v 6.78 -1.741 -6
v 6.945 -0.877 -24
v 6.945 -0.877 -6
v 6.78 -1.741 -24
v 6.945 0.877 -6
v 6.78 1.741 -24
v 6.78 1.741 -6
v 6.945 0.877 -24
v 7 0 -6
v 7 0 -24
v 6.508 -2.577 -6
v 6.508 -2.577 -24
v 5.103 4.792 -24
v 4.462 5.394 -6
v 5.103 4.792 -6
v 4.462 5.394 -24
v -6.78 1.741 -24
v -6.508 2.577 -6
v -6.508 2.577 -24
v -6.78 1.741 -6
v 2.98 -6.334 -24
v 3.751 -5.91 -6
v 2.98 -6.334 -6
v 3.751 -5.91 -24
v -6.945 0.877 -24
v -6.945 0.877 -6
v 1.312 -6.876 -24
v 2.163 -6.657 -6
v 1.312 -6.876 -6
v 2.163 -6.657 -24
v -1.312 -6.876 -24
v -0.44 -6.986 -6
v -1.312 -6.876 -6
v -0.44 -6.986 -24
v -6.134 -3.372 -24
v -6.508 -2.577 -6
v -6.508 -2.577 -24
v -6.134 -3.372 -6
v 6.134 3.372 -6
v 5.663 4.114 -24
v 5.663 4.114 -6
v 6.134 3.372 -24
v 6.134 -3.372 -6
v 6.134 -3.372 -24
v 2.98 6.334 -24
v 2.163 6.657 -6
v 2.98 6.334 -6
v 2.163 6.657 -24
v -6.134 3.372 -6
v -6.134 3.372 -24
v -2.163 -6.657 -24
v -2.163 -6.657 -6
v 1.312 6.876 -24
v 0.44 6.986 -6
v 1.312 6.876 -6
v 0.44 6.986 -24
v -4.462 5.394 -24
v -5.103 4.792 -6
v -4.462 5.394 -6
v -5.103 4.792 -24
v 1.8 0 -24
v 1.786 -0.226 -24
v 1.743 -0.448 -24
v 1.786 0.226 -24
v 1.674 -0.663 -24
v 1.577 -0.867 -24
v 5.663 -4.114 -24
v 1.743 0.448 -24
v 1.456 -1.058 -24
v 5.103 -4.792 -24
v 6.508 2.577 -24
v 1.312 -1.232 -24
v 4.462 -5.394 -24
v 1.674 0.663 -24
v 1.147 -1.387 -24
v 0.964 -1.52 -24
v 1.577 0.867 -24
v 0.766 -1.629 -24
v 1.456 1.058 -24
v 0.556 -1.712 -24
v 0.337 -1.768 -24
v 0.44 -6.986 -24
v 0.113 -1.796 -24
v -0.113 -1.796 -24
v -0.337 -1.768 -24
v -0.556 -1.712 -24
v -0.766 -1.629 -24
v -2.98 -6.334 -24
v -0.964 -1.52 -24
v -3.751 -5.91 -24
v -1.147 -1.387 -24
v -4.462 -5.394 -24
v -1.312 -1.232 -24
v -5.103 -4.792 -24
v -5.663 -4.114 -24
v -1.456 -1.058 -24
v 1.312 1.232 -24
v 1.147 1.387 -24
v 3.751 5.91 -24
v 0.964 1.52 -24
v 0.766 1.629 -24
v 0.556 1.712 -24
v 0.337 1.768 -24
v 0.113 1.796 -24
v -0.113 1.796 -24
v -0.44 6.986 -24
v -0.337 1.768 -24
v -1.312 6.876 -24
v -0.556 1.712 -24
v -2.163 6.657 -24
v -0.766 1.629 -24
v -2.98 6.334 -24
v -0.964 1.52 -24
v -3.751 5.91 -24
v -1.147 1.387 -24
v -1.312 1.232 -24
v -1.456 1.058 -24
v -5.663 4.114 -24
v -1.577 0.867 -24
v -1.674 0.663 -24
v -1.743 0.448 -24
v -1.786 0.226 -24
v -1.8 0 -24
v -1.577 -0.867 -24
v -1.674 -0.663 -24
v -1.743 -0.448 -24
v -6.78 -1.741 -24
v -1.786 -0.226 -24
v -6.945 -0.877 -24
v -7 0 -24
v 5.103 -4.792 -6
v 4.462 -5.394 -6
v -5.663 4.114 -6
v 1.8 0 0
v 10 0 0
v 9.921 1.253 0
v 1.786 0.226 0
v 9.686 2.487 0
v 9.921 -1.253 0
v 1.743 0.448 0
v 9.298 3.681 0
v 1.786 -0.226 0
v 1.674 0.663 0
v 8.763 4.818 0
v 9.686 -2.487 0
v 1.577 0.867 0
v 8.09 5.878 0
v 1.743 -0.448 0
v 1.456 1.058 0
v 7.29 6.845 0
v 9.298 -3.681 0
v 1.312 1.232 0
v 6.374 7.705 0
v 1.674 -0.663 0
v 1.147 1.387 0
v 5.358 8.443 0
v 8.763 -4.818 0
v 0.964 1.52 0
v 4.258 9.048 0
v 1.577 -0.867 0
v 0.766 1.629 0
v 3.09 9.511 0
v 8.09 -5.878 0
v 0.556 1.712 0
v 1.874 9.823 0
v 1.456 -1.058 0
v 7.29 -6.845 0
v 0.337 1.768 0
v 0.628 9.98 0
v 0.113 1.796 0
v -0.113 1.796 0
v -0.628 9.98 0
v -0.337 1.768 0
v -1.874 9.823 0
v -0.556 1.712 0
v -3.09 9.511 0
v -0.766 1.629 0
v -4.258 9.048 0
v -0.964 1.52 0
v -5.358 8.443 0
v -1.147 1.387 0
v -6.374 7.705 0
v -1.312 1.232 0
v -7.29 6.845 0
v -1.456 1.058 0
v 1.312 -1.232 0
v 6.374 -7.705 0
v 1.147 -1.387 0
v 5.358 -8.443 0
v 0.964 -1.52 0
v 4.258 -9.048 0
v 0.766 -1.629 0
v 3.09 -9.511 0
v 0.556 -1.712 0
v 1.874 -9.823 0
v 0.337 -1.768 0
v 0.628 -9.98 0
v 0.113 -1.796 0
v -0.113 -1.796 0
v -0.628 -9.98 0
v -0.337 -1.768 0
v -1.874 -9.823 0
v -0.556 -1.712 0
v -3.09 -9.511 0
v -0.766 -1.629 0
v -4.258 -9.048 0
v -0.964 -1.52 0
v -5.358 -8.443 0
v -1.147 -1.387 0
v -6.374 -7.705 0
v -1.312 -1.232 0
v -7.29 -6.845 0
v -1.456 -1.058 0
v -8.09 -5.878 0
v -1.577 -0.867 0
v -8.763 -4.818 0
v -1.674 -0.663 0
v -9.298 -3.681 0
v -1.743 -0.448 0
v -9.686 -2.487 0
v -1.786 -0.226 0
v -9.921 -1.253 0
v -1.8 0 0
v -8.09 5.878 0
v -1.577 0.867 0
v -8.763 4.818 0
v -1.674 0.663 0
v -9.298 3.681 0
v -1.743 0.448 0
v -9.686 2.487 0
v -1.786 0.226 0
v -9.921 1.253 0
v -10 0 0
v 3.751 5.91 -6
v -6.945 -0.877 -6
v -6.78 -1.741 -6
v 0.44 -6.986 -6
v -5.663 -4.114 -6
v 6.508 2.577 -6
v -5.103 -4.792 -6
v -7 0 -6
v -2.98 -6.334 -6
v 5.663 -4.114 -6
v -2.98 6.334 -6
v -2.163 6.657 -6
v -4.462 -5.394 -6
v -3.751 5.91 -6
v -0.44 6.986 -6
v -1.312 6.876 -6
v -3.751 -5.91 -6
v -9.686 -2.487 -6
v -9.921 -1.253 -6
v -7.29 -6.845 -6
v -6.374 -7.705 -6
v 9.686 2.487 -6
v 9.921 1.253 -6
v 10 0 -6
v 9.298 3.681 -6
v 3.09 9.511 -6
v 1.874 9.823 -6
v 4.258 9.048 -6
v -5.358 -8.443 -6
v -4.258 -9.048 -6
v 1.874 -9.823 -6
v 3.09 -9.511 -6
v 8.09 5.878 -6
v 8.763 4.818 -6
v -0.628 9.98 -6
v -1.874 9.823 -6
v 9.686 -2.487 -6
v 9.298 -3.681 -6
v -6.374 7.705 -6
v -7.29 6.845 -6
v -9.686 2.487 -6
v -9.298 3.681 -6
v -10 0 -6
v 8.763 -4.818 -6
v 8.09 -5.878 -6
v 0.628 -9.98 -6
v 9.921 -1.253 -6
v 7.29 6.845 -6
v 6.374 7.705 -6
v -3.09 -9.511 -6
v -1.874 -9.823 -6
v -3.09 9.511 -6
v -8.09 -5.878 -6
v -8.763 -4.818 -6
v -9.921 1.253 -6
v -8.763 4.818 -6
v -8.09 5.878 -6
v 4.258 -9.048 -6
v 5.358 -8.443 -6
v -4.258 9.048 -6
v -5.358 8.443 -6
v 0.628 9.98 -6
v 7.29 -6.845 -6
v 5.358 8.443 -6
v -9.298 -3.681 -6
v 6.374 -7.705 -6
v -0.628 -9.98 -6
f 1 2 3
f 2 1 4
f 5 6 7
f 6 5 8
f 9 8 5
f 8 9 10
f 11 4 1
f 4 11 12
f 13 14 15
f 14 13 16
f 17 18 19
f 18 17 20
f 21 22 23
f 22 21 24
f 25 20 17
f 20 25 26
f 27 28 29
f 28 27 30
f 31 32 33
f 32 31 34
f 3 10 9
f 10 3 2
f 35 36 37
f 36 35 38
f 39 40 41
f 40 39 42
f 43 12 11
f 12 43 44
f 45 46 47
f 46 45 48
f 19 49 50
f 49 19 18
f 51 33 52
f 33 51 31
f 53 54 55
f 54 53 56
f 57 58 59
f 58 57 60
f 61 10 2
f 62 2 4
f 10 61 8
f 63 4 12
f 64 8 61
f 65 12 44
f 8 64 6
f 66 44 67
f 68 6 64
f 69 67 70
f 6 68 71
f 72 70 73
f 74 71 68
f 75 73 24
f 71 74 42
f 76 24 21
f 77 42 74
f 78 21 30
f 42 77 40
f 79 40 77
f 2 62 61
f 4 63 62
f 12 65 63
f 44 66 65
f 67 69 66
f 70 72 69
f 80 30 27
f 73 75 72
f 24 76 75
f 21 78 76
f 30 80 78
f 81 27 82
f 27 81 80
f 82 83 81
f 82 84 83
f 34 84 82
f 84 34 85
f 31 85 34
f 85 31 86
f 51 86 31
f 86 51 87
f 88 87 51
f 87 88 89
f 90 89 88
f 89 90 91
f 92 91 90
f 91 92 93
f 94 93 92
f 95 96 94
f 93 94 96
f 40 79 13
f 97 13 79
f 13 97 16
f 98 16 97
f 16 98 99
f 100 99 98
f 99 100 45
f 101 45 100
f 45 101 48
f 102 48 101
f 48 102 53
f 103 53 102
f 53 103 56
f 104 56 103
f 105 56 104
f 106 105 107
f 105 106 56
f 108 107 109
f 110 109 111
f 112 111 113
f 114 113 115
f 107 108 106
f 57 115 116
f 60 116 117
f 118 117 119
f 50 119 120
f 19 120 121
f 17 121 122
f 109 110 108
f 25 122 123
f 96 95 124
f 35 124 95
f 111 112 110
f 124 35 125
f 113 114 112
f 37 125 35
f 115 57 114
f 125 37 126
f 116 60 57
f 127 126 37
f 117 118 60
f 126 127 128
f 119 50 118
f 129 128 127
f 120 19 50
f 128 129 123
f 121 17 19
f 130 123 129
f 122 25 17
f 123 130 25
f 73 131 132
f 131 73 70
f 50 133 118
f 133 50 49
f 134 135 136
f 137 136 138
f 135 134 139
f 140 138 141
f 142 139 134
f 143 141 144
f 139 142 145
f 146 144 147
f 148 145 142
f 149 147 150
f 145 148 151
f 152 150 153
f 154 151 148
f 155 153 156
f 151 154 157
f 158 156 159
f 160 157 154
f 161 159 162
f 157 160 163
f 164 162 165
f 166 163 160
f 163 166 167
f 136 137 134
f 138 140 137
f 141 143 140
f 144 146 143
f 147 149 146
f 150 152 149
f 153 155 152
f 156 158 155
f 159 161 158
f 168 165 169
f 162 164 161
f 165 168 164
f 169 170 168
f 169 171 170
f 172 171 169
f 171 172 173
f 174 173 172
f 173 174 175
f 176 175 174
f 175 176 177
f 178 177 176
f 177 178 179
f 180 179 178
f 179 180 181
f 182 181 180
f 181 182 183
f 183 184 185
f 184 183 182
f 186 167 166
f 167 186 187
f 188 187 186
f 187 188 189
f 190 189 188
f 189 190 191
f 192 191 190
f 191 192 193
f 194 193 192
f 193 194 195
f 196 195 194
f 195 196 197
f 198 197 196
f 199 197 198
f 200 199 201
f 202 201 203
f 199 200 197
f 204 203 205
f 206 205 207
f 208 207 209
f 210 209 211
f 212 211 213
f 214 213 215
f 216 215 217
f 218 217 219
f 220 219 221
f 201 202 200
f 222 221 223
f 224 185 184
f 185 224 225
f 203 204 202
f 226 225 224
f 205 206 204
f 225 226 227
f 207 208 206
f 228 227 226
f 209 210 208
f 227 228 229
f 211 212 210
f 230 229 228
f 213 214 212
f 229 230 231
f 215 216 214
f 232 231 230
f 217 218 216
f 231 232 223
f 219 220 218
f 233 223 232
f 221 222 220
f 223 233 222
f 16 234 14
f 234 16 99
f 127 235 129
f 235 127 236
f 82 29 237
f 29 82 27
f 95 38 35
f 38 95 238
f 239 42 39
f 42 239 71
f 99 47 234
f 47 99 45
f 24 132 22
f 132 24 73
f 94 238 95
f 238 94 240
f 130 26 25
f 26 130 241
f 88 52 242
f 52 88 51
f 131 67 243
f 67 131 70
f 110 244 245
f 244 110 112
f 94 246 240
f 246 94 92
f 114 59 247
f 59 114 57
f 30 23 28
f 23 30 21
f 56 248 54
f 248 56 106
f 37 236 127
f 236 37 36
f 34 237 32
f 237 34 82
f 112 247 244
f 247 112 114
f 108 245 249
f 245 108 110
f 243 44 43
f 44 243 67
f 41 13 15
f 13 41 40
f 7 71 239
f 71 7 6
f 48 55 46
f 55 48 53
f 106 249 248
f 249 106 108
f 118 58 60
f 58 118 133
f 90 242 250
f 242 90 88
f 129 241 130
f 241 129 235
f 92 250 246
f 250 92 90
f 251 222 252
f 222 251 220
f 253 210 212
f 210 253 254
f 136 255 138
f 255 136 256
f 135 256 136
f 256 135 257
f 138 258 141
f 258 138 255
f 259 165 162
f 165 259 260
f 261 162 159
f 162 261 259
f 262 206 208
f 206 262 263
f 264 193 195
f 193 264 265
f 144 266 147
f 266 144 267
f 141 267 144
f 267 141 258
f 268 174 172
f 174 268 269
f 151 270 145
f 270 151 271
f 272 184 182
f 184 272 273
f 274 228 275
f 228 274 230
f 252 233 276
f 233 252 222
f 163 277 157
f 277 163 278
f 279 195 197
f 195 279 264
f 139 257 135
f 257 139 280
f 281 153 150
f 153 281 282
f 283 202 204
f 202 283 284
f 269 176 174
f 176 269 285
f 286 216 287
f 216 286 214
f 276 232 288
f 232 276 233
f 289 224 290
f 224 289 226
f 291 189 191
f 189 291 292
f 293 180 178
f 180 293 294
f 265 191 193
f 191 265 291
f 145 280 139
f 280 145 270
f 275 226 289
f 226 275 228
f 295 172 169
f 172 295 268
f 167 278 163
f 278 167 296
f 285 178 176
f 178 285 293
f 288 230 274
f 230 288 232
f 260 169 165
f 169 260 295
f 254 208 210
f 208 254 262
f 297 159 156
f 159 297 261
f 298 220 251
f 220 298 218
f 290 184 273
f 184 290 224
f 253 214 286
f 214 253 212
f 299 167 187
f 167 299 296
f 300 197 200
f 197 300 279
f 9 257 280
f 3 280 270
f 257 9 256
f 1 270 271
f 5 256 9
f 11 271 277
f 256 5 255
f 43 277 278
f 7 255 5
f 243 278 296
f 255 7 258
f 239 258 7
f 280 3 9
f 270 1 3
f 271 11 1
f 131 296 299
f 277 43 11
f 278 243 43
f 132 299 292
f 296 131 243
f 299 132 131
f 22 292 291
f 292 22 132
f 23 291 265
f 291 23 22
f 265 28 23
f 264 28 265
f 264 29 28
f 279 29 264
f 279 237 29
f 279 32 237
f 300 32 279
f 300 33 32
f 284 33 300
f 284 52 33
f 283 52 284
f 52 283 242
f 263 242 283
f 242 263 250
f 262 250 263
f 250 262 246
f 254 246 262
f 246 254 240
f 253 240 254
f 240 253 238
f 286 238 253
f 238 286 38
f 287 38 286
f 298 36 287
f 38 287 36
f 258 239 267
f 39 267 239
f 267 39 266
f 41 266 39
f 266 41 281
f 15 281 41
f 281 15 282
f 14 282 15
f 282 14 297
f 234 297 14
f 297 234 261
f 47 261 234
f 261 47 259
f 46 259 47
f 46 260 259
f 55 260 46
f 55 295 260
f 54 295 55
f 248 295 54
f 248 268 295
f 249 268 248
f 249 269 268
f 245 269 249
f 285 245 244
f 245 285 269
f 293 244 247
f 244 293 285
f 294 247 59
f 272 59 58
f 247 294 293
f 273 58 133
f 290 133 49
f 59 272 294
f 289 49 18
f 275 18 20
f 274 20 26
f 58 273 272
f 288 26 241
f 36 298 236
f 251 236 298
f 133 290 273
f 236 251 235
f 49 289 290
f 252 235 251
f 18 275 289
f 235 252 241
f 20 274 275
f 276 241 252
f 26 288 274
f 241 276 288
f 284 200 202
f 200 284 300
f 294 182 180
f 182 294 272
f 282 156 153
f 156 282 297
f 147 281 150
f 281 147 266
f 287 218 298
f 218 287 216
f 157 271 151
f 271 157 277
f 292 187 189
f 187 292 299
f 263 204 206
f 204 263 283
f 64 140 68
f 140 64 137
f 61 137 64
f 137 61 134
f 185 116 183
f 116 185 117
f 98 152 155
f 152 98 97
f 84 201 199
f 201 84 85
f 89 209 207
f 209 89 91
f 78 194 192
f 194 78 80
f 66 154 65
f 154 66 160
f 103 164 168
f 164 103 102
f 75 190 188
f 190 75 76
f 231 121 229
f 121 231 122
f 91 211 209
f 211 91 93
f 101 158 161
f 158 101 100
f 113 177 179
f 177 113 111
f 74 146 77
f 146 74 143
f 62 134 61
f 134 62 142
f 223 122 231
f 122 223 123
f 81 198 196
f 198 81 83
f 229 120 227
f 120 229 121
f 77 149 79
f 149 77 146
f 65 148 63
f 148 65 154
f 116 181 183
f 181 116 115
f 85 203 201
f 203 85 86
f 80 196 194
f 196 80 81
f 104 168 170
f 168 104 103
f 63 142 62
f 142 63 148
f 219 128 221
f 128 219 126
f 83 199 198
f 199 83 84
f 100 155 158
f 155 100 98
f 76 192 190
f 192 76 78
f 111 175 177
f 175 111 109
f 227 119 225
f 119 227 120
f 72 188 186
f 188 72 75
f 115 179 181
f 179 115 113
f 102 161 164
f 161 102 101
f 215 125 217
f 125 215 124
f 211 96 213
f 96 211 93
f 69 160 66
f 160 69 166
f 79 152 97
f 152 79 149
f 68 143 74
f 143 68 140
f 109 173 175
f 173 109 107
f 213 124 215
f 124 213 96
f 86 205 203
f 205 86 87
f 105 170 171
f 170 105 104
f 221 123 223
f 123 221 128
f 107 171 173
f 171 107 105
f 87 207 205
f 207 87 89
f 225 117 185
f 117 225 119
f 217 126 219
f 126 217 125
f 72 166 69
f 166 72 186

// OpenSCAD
$fn = 50;


difference() {
	union() {
		translate(v = [0, 0, -24.0000000000]) {
			cylinder(h = 24, r = 7.0000000000);
		}
		translate(v = [0, 0, -6.0000000000]) {
			cylinder(h = 6, r = 10.0000000000);
		}
	}
	union() {
		#translate(v = [0, 0, -24]) {
			cylinder(h = 24, r = 1.8000000000);
		}
	}
}
